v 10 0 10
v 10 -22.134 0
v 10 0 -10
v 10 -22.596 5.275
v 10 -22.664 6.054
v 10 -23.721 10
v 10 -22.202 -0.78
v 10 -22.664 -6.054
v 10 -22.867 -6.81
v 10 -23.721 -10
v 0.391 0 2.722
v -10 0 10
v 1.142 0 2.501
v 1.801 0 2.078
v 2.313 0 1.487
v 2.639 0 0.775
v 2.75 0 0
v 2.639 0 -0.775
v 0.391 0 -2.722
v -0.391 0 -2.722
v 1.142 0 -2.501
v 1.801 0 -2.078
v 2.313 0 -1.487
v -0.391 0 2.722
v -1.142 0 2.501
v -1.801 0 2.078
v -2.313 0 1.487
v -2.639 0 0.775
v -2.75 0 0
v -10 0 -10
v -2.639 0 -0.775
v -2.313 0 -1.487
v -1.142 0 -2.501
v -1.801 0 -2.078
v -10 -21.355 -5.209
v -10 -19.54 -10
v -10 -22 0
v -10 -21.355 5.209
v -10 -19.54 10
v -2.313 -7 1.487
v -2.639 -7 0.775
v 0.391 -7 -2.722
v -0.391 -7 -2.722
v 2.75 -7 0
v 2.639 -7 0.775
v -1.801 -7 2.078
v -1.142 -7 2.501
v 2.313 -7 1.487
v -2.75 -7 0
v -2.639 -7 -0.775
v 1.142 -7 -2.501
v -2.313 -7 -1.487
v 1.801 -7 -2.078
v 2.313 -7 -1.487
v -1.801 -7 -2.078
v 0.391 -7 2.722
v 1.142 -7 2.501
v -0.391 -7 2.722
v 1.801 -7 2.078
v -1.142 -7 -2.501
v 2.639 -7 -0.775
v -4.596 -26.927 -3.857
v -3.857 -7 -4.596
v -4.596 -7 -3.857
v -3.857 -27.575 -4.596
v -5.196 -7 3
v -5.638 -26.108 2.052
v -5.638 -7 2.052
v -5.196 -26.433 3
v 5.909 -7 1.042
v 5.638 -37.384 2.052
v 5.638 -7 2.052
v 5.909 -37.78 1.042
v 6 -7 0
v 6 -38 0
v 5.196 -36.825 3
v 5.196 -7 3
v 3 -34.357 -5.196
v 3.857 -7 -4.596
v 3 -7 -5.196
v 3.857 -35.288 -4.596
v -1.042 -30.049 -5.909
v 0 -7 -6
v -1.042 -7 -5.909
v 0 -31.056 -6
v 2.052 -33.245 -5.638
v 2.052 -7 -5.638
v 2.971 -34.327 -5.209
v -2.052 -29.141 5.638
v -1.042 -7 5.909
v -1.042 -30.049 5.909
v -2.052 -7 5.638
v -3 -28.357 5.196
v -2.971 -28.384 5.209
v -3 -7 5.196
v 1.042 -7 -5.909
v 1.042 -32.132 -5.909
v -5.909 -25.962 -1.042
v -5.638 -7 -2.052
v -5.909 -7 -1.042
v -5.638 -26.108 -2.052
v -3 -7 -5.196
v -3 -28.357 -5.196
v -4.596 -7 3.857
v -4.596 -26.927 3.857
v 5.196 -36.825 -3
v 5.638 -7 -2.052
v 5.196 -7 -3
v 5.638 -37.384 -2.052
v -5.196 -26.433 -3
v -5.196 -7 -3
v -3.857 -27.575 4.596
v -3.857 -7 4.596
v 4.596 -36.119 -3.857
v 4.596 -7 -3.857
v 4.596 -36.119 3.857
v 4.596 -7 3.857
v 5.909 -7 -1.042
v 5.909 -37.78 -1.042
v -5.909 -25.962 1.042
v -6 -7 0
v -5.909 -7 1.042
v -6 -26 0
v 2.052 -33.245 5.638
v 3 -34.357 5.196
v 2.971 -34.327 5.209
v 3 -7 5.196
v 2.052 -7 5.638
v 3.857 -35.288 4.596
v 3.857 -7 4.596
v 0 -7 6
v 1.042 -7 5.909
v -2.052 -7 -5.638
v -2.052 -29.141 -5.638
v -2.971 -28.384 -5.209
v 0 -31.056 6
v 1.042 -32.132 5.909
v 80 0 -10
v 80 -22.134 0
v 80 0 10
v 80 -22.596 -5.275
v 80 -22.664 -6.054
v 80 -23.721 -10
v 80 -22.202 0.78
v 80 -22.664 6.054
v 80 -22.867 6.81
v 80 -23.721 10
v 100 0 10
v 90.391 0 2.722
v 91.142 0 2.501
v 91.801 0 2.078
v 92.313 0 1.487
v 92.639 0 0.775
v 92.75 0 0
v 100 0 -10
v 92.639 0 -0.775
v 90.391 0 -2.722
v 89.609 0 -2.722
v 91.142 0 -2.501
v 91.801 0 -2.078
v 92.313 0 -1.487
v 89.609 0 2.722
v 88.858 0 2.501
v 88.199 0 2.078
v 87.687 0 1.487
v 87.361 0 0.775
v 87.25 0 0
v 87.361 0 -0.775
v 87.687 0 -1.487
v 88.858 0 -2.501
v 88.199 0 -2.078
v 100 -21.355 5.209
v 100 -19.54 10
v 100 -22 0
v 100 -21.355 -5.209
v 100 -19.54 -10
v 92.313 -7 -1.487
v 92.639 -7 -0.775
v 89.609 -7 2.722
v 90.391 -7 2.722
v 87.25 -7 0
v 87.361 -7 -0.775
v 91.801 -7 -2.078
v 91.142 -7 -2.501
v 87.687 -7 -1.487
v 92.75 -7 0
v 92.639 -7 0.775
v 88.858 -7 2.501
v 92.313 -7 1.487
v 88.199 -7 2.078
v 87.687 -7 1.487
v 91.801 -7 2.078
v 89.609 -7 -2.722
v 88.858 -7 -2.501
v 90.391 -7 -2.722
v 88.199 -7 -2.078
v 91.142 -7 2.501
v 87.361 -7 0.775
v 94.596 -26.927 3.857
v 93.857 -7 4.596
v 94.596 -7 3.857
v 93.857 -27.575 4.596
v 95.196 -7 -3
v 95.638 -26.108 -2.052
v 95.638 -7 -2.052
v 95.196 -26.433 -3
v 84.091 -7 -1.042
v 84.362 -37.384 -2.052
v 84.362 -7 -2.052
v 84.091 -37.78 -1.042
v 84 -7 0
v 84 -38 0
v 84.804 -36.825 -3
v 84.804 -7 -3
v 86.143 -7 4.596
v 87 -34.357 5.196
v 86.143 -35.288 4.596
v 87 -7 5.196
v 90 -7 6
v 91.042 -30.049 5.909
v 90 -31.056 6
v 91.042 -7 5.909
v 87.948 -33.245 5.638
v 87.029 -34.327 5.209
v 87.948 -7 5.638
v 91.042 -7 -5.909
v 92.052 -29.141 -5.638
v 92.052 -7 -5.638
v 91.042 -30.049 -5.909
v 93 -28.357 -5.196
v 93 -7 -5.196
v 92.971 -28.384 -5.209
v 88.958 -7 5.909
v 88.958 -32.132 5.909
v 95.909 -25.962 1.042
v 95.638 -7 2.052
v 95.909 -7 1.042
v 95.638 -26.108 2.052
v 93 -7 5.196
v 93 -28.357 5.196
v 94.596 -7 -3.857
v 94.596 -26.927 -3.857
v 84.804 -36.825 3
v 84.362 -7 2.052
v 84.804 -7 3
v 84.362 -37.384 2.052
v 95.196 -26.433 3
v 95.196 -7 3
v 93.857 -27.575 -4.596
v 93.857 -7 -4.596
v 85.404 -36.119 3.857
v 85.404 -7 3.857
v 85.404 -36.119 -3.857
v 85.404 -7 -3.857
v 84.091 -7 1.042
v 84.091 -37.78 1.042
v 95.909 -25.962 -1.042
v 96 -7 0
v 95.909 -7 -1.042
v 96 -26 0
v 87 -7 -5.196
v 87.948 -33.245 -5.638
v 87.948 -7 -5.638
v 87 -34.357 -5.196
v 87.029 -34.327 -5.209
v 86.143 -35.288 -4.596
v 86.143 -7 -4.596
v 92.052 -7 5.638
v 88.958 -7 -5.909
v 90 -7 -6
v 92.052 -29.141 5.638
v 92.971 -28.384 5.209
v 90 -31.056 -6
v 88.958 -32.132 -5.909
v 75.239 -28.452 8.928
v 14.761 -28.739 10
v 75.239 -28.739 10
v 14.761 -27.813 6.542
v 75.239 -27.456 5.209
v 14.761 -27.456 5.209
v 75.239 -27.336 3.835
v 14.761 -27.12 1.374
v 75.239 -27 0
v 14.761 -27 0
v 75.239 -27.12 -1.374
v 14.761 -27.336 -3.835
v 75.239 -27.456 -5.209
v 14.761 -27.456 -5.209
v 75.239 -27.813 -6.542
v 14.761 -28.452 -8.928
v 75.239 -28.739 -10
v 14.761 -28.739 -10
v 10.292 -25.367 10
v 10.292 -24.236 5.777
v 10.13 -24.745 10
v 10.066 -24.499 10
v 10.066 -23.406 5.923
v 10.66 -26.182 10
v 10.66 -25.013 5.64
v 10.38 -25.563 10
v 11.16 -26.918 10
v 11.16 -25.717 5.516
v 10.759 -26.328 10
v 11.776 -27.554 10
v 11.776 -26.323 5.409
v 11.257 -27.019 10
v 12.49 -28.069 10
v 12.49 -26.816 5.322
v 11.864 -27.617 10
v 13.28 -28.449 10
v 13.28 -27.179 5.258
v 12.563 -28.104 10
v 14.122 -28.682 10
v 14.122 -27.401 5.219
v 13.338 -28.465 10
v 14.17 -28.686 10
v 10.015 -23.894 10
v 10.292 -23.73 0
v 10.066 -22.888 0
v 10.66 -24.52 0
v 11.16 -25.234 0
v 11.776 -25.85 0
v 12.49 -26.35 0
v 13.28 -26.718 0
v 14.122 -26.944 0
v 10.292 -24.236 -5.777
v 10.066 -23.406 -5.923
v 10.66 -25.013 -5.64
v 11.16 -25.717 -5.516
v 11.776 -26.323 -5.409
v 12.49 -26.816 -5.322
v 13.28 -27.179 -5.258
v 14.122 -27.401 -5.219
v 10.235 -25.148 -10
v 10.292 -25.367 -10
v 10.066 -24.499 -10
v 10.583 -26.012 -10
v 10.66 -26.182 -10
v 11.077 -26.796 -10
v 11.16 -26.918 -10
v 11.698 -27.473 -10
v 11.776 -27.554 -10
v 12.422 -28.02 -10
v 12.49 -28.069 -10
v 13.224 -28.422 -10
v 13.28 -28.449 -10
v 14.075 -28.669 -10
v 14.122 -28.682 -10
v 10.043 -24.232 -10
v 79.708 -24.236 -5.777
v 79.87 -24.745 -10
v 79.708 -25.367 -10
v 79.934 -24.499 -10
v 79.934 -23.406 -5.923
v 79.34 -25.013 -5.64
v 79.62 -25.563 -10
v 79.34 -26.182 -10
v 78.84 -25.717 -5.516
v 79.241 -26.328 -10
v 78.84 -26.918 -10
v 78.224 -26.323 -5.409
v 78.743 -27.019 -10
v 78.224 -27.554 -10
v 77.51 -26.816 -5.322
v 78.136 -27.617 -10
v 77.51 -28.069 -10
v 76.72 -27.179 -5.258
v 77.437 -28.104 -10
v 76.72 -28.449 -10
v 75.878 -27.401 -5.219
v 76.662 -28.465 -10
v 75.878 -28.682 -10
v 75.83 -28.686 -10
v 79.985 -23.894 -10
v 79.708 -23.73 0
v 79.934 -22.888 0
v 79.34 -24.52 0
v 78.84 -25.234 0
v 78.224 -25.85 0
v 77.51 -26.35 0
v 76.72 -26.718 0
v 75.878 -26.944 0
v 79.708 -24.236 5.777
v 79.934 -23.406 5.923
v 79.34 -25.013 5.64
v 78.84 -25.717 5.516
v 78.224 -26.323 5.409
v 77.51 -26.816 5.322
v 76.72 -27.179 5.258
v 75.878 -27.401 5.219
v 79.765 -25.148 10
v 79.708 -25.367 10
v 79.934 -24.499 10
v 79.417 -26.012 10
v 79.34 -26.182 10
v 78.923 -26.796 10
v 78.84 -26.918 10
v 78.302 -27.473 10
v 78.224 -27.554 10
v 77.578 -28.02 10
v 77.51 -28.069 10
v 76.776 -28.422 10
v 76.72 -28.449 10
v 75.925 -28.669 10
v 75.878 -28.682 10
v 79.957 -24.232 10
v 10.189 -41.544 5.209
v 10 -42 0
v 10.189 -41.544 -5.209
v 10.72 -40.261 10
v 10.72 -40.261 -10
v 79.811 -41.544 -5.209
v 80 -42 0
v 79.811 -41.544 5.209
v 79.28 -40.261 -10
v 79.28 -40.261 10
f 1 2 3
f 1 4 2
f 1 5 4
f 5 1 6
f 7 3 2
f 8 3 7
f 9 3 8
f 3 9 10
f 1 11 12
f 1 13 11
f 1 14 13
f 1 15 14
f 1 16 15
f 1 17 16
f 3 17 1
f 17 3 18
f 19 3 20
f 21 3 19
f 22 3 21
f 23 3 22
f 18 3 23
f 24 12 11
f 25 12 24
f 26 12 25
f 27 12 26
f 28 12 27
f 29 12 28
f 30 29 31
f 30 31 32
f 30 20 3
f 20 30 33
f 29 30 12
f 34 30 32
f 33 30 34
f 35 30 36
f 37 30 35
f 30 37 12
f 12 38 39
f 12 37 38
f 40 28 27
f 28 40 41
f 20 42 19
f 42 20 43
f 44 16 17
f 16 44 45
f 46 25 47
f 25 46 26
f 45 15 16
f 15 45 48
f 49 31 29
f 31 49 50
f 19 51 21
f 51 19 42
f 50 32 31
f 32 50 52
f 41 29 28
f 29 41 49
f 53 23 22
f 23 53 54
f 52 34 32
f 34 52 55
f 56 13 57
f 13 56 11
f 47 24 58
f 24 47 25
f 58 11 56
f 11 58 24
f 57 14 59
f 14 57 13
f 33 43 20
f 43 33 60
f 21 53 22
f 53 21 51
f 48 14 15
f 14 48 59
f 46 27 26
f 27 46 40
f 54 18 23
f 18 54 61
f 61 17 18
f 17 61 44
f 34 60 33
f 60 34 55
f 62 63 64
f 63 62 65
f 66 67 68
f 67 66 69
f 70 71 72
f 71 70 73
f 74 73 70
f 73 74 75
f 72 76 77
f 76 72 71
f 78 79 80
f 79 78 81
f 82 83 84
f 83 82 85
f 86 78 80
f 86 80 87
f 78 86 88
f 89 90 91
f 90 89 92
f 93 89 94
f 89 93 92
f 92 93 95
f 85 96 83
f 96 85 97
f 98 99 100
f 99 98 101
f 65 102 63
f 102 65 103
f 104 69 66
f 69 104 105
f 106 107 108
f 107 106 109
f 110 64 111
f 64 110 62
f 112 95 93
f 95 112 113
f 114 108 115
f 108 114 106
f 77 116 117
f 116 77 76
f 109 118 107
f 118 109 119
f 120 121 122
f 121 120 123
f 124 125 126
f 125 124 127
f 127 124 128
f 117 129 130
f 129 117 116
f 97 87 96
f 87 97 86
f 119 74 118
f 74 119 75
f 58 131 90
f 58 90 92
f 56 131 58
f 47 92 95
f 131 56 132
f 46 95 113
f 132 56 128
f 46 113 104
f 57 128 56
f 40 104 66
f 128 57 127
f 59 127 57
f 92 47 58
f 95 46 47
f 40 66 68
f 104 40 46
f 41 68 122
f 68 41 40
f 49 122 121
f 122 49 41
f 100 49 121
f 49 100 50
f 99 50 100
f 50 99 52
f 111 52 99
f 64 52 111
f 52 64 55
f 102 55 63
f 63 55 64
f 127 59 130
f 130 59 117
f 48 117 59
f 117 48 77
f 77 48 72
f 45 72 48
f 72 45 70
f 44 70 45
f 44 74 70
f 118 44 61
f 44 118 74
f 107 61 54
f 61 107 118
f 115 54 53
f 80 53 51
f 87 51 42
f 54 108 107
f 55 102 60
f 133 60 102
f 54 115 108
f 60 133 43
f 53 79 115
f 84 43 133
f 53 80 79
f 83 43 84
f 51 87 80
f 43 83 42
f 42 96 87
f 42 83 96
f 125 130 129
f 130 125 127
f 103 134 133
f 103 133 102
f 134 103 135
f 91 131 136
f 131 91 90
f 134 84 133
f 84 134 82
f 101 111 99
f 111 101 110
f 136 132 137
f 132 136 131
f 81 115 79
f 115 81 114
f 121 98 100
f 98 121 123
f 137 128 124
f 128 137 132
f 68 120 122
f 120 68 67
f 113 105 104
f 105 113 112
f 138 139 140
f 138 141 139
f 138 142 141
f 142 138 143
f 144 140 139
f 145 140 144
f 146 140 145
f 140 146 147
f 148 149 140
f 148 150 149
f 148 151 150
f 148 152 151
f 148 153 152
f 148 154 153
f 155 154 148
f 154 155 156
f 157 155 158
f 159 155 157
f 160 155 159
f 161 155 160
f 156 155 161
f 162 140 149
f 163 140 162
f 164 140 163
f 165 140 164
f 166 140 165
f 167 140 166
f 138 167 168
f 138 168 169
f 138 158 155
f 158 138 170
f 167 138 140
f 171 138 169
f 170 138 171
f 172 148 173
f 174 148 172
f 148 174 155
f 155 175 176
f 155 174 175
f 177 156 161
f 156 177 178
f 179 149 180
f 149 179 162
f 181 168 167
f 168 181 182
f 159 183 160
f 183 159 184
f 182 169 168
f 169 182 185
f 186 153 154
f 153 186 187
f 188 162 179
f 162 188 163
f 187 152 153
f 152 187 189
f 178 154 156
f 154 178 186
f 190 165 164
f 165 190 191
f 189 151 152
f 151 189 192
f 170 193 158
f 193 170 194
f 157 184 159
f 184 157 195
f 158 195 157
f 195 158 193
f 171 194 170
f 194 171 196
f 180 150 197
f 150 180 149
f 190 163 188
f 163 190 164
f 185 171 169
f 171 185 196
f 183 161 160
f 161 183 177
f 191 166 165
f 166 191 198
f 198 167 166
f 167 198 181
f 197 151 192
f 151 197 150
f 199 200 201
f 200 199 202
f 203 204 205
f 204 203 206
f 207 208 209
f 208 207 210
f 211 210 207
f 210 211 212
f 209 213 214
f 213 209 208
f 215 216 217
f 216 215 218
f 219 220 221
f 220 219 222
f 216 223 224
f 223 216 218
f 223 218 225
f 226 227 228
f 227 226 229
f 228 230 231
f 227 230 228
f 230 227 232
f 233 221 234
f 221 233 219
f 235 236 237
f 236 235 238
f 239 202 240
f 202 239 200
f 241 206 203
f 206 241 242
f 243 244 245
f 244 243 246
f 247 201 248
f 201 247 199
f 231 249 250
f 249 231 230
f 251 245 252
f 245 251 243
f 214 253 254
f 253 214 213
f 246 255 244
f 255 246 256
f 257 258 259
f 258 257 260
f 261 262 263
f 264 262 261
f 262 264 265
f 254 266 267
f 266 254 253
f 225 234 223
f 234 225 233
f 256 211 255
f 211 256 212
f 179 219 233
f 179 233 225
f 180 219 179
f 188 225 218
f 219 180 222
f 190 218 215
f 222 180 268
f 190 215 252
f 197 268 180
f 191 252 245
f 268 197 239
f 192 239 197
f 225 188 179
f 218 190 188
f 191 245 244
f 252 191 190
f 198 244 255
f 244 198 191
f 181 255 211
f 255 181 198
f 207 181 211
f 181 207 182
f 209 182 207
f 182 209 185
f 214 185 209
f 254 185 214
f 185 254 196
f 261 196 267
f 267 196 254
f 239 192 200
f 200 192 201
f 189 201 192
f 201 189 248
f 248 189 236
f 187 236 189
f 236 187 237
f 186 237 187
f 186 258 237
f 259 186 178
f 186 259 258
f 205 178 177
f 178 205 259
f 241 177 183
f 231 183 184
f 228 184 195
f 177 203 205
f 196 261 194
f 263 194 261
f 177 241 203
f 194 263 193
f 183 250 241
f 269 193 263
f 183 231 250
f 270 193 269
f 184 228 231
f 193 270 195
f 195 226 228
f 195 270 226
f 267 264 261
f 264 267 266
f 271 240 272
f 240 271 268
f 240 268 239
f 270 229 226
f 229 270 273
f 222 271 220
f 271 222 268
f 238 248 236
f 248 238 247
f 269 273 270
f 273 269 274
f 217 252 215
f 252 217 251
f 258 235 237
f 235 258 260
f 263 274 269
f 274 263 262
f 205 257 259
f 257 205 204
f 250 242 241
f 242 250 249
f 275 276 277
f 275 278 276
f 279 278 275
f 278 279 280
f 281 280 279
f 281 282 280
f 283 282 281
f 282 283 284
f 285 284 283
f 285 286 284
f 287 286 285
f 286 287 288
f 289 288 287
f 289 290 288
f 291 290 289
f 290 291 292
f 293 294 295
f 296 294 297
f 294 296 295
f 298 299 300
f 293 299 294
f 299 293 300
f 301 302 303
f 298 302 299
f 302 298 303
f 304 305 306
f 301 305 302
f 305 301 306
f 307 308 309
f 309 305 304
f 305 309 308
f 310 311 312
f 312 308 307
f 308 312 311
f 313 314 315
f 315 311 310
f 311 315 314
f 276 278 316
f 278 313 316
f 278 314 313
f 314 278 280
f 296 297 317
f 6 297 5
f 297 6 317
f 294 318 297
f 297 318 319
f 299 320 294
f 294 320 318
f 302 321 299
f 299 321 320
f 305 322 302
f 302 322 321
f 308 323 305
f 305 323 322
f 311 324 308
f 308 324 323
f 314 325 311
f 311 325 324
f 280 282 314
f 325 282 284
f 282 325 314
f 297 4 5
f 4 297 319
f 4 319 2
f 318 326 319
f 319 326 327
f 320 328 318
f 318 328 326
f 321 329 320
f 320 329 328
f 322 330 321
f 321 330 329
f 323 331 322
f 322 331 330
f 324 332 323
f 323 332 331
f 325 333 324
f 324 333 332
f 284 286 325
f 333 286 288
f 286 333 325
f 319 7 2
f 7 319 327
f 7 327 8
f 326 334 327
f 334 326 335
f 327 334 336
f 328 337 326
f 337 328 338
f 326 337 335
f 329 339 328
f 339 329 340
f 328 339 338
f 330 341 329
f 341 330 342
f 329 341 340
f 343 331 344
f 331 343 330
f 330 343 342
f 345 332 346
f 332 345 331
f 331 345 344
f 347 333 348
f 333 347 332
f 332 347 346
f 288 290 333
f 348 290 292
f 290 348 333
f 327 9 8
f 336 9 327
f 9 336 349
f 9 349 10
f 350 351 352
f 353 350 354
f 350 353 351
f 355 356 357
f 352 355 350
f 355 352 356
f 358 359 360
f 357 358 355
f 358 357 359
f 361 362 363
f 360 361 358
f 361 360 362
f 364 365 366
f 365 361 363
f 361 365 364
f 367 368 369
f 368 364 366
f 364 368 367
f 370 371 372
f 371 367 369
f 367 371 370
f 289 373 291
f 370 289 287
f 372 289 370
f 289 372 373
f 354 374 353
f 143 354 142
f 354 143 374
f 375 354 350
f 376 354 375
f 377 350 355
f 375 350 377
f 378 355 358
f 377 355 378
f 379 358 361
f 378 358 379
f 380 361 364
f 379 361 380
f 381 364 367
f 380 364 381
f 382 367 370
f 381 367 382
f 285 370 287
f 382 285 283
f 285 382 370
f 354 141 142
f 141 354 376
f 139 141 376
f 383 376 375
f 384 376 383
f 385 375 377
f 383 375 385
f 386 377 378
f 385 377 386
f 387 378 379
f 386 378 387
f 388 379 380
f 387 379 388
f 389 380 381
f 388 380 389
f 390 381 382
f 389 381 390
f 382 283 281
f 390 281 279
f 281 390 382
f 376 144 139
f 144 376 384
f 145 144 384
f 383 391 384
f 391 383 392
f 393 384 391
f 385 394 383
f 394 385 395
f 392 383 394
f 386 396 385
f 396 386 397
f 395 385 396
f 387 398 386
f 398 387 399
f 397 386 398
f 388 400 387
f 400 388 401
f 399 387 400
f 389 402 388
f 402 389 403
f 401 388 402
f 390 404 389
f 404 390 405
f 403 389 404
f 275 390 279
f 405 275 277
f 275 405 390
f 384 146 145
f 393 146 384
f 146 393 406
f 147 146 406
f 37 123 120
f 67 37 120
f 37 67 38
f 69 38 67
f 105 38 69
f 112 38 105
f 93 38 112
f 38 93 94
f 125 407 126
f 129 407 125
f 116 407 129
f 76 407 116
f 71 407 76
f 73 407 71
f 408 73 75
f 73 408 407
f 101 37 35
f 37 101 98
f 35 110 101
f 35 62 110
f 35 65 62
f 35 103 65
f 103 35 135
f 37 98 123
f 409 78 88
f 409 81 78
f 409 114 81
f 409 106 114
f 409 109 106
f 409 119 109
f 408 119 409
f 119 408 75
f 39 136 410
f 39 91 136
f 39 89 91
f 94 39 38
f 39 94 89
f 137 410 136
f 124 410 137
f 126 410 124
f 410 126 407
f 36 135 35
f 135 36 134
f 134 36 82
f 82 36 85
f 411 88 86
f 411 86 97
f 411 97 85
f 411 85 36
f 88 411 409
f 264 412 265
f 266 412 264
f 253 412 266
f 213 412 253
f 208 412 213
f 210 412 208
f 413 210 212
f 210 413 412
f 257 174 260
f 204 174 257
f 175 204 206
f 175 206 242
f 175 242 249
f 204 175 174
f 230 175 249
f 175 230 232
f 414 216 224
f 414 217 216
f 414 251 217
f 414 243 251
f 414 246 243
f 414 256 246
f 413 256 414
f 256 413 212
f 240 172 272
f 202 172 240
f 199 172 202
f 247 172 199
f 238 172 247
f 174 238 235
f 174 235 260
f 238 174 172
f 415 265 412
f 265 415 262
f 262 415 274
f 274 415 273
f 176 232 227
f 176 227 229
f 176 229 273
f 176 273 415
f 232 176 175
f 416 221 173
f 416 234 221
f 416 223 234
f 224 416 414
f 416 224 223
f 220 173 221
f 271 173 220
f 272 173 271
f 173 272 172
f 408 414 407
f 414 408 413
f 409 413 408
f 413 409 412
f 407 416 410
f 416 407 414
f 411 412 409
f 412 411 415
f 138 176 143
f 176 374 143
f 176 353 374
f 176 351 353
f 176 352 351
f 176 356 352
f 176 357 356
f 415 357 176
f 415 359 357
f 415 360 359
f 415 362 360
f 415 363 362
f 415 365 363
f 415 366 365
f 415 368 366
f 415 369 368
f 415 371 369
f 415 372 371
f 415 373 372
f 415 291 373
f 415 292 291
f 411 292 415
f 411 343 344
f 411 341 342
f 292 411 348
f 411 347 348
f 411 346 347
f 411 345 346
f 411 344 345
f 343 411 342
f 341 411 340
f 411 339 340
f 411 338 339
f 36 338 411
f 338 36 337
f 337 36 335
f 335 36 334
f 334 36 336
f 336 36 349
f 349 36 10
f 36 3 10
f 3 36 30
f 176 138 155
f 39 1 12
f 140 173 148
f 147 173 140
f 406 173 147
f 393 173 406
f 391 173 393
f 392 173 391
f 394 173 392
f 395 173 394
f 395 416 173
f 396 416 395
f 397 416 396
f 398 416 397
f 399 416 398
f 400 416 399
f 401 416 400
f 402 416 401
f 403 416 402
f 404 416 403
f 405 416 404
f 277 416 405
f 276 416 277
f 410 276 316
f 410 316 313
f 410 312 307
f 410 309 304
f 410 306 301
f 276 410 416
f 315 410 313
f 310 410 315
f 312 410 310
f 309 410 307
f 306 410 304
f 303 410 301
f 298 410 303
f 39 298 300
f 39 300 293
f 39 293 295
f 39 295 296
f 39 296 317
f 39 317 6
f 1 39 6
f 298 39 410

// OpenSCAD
length = 110;
width = 20;
height = 42;
boltHoleDiameter = 5.5;
boltCounterboreDiameter = 12;
bottomThickness = 7;
filletRadius = 5;

// $fn=200; // That's not efficient
// Much better
$fa = 10;
$fs = 0.8;

rHandle = 2 * (width/2) + 10;

module side() {
  difference() {
    translate([-width/2,-width,0]) {
      cube([width,width*2,height]);
    }
    translate([0, 0, -1]) cylinder(d=boltHoleDiameter, h=height+2);
    translate([0, 0, bottomThickness])cylinder(d=boltCounterboreDiameter, h=height);
  }
}

module topCurve() {
  difference() {
    translate([0,-width-rHandle]) cube([length*2, width*2+rHandle*2, height+rHandle*2]);
    rotate([0,90,0]) cylinder(r=rHandle, h=length*2);
  }
}

module sideCuts() {
  translate([-width/2,0,height-width]) 
    rotate([0, -45, 0]) 
      translate([-10,0,-rHandle]) topCurve();
}

rotate([90,0,0])
difference() {
  union() {
    side();
    translate([length-width,0,0]) rotate([0,0,180]) side();
    translate([width/2-0.01,0,height+rHandle/2]) rotate([0,90,0]) {
       cylinder(r=rHandle, h=length-width*2+0.02);
       translate([0,0,filletRadius]) fil_polar_i(R = rHandle+filletRadius-0.02, r=filletRadius);
       translate([0,0,length-width*2+0.02-filletRadius]) rotate([180,0,0]) fil_polar_i(R = rHandle+filletRadius-0.02, r=filletRadius);
    }
  }
  sideCuts();
  translate([length-width,0,0]) rotate([0,0,180]) sideCuts();
  translate([-length,-width-width/2,-1]) cube([length*3,width, height*2]);
  translate([-length,width/2,-1]) cube([length*3,width, height*2]);
  translate([-width, 0, height-rHandle]) topCurve();
}





/* 
  openscad-fillets by jfhbrook 
  https://github.com/jfhbrook/openscad-fillets

  fillets.scad contents included below
*/ 

// 2d primitive for outside fillets.
module fil_2d_o(r, angle=90) {
  intersection() {
    circle(r=r);
    polygon([
      [0, 0],
      [0, r],
      [r * tan(angle/2), r],
      [r * sin(angle), r * cos(angle)]
    ]);
  }
}

// 2d primitive for inside fillets.
module fil_2d_i(r, angle=90) {
  difference() {
    polygon([
      [0, 0],
      [0, -r],
      [-r * tan(angle/2), -r],
      [-r * sin(angle), -r * cos(angle)]
    ]);
    circle(r=r);
  }
}

// 3d polar outside fillet.
module fil_polar_o(R, r, angle=90) {
  rotate_extrude(convexity=10) {
    translate([R, 0, 0]) {
      fil_2d_o(r, angle);
    }
  }
}

// 3d polar inside fillet.
module fil_polar_i(R, r, angle=90) {
  rotate_extrude(convexity=10) {
    translate([R, 0, 0]) {
      fil_2d_i(r, angle);
    }
  }
}

// 3d linear outside fillet.
module fil_linear_o(l, r, angle=90) {
  rotate([0, -90, 180]) {
    linear_extrude(height=l, center=false) {
      fil_2d_o(r, angle);
    }
  }
}

// 3d linear inside fillet.
module fil_linear_o(l, r, angle=90) {
  rotate([0, -90, 180]) {
    linear_extrude(height=l, center=false) {
      fil_2d_i(r, angle);
    }
  }
}
